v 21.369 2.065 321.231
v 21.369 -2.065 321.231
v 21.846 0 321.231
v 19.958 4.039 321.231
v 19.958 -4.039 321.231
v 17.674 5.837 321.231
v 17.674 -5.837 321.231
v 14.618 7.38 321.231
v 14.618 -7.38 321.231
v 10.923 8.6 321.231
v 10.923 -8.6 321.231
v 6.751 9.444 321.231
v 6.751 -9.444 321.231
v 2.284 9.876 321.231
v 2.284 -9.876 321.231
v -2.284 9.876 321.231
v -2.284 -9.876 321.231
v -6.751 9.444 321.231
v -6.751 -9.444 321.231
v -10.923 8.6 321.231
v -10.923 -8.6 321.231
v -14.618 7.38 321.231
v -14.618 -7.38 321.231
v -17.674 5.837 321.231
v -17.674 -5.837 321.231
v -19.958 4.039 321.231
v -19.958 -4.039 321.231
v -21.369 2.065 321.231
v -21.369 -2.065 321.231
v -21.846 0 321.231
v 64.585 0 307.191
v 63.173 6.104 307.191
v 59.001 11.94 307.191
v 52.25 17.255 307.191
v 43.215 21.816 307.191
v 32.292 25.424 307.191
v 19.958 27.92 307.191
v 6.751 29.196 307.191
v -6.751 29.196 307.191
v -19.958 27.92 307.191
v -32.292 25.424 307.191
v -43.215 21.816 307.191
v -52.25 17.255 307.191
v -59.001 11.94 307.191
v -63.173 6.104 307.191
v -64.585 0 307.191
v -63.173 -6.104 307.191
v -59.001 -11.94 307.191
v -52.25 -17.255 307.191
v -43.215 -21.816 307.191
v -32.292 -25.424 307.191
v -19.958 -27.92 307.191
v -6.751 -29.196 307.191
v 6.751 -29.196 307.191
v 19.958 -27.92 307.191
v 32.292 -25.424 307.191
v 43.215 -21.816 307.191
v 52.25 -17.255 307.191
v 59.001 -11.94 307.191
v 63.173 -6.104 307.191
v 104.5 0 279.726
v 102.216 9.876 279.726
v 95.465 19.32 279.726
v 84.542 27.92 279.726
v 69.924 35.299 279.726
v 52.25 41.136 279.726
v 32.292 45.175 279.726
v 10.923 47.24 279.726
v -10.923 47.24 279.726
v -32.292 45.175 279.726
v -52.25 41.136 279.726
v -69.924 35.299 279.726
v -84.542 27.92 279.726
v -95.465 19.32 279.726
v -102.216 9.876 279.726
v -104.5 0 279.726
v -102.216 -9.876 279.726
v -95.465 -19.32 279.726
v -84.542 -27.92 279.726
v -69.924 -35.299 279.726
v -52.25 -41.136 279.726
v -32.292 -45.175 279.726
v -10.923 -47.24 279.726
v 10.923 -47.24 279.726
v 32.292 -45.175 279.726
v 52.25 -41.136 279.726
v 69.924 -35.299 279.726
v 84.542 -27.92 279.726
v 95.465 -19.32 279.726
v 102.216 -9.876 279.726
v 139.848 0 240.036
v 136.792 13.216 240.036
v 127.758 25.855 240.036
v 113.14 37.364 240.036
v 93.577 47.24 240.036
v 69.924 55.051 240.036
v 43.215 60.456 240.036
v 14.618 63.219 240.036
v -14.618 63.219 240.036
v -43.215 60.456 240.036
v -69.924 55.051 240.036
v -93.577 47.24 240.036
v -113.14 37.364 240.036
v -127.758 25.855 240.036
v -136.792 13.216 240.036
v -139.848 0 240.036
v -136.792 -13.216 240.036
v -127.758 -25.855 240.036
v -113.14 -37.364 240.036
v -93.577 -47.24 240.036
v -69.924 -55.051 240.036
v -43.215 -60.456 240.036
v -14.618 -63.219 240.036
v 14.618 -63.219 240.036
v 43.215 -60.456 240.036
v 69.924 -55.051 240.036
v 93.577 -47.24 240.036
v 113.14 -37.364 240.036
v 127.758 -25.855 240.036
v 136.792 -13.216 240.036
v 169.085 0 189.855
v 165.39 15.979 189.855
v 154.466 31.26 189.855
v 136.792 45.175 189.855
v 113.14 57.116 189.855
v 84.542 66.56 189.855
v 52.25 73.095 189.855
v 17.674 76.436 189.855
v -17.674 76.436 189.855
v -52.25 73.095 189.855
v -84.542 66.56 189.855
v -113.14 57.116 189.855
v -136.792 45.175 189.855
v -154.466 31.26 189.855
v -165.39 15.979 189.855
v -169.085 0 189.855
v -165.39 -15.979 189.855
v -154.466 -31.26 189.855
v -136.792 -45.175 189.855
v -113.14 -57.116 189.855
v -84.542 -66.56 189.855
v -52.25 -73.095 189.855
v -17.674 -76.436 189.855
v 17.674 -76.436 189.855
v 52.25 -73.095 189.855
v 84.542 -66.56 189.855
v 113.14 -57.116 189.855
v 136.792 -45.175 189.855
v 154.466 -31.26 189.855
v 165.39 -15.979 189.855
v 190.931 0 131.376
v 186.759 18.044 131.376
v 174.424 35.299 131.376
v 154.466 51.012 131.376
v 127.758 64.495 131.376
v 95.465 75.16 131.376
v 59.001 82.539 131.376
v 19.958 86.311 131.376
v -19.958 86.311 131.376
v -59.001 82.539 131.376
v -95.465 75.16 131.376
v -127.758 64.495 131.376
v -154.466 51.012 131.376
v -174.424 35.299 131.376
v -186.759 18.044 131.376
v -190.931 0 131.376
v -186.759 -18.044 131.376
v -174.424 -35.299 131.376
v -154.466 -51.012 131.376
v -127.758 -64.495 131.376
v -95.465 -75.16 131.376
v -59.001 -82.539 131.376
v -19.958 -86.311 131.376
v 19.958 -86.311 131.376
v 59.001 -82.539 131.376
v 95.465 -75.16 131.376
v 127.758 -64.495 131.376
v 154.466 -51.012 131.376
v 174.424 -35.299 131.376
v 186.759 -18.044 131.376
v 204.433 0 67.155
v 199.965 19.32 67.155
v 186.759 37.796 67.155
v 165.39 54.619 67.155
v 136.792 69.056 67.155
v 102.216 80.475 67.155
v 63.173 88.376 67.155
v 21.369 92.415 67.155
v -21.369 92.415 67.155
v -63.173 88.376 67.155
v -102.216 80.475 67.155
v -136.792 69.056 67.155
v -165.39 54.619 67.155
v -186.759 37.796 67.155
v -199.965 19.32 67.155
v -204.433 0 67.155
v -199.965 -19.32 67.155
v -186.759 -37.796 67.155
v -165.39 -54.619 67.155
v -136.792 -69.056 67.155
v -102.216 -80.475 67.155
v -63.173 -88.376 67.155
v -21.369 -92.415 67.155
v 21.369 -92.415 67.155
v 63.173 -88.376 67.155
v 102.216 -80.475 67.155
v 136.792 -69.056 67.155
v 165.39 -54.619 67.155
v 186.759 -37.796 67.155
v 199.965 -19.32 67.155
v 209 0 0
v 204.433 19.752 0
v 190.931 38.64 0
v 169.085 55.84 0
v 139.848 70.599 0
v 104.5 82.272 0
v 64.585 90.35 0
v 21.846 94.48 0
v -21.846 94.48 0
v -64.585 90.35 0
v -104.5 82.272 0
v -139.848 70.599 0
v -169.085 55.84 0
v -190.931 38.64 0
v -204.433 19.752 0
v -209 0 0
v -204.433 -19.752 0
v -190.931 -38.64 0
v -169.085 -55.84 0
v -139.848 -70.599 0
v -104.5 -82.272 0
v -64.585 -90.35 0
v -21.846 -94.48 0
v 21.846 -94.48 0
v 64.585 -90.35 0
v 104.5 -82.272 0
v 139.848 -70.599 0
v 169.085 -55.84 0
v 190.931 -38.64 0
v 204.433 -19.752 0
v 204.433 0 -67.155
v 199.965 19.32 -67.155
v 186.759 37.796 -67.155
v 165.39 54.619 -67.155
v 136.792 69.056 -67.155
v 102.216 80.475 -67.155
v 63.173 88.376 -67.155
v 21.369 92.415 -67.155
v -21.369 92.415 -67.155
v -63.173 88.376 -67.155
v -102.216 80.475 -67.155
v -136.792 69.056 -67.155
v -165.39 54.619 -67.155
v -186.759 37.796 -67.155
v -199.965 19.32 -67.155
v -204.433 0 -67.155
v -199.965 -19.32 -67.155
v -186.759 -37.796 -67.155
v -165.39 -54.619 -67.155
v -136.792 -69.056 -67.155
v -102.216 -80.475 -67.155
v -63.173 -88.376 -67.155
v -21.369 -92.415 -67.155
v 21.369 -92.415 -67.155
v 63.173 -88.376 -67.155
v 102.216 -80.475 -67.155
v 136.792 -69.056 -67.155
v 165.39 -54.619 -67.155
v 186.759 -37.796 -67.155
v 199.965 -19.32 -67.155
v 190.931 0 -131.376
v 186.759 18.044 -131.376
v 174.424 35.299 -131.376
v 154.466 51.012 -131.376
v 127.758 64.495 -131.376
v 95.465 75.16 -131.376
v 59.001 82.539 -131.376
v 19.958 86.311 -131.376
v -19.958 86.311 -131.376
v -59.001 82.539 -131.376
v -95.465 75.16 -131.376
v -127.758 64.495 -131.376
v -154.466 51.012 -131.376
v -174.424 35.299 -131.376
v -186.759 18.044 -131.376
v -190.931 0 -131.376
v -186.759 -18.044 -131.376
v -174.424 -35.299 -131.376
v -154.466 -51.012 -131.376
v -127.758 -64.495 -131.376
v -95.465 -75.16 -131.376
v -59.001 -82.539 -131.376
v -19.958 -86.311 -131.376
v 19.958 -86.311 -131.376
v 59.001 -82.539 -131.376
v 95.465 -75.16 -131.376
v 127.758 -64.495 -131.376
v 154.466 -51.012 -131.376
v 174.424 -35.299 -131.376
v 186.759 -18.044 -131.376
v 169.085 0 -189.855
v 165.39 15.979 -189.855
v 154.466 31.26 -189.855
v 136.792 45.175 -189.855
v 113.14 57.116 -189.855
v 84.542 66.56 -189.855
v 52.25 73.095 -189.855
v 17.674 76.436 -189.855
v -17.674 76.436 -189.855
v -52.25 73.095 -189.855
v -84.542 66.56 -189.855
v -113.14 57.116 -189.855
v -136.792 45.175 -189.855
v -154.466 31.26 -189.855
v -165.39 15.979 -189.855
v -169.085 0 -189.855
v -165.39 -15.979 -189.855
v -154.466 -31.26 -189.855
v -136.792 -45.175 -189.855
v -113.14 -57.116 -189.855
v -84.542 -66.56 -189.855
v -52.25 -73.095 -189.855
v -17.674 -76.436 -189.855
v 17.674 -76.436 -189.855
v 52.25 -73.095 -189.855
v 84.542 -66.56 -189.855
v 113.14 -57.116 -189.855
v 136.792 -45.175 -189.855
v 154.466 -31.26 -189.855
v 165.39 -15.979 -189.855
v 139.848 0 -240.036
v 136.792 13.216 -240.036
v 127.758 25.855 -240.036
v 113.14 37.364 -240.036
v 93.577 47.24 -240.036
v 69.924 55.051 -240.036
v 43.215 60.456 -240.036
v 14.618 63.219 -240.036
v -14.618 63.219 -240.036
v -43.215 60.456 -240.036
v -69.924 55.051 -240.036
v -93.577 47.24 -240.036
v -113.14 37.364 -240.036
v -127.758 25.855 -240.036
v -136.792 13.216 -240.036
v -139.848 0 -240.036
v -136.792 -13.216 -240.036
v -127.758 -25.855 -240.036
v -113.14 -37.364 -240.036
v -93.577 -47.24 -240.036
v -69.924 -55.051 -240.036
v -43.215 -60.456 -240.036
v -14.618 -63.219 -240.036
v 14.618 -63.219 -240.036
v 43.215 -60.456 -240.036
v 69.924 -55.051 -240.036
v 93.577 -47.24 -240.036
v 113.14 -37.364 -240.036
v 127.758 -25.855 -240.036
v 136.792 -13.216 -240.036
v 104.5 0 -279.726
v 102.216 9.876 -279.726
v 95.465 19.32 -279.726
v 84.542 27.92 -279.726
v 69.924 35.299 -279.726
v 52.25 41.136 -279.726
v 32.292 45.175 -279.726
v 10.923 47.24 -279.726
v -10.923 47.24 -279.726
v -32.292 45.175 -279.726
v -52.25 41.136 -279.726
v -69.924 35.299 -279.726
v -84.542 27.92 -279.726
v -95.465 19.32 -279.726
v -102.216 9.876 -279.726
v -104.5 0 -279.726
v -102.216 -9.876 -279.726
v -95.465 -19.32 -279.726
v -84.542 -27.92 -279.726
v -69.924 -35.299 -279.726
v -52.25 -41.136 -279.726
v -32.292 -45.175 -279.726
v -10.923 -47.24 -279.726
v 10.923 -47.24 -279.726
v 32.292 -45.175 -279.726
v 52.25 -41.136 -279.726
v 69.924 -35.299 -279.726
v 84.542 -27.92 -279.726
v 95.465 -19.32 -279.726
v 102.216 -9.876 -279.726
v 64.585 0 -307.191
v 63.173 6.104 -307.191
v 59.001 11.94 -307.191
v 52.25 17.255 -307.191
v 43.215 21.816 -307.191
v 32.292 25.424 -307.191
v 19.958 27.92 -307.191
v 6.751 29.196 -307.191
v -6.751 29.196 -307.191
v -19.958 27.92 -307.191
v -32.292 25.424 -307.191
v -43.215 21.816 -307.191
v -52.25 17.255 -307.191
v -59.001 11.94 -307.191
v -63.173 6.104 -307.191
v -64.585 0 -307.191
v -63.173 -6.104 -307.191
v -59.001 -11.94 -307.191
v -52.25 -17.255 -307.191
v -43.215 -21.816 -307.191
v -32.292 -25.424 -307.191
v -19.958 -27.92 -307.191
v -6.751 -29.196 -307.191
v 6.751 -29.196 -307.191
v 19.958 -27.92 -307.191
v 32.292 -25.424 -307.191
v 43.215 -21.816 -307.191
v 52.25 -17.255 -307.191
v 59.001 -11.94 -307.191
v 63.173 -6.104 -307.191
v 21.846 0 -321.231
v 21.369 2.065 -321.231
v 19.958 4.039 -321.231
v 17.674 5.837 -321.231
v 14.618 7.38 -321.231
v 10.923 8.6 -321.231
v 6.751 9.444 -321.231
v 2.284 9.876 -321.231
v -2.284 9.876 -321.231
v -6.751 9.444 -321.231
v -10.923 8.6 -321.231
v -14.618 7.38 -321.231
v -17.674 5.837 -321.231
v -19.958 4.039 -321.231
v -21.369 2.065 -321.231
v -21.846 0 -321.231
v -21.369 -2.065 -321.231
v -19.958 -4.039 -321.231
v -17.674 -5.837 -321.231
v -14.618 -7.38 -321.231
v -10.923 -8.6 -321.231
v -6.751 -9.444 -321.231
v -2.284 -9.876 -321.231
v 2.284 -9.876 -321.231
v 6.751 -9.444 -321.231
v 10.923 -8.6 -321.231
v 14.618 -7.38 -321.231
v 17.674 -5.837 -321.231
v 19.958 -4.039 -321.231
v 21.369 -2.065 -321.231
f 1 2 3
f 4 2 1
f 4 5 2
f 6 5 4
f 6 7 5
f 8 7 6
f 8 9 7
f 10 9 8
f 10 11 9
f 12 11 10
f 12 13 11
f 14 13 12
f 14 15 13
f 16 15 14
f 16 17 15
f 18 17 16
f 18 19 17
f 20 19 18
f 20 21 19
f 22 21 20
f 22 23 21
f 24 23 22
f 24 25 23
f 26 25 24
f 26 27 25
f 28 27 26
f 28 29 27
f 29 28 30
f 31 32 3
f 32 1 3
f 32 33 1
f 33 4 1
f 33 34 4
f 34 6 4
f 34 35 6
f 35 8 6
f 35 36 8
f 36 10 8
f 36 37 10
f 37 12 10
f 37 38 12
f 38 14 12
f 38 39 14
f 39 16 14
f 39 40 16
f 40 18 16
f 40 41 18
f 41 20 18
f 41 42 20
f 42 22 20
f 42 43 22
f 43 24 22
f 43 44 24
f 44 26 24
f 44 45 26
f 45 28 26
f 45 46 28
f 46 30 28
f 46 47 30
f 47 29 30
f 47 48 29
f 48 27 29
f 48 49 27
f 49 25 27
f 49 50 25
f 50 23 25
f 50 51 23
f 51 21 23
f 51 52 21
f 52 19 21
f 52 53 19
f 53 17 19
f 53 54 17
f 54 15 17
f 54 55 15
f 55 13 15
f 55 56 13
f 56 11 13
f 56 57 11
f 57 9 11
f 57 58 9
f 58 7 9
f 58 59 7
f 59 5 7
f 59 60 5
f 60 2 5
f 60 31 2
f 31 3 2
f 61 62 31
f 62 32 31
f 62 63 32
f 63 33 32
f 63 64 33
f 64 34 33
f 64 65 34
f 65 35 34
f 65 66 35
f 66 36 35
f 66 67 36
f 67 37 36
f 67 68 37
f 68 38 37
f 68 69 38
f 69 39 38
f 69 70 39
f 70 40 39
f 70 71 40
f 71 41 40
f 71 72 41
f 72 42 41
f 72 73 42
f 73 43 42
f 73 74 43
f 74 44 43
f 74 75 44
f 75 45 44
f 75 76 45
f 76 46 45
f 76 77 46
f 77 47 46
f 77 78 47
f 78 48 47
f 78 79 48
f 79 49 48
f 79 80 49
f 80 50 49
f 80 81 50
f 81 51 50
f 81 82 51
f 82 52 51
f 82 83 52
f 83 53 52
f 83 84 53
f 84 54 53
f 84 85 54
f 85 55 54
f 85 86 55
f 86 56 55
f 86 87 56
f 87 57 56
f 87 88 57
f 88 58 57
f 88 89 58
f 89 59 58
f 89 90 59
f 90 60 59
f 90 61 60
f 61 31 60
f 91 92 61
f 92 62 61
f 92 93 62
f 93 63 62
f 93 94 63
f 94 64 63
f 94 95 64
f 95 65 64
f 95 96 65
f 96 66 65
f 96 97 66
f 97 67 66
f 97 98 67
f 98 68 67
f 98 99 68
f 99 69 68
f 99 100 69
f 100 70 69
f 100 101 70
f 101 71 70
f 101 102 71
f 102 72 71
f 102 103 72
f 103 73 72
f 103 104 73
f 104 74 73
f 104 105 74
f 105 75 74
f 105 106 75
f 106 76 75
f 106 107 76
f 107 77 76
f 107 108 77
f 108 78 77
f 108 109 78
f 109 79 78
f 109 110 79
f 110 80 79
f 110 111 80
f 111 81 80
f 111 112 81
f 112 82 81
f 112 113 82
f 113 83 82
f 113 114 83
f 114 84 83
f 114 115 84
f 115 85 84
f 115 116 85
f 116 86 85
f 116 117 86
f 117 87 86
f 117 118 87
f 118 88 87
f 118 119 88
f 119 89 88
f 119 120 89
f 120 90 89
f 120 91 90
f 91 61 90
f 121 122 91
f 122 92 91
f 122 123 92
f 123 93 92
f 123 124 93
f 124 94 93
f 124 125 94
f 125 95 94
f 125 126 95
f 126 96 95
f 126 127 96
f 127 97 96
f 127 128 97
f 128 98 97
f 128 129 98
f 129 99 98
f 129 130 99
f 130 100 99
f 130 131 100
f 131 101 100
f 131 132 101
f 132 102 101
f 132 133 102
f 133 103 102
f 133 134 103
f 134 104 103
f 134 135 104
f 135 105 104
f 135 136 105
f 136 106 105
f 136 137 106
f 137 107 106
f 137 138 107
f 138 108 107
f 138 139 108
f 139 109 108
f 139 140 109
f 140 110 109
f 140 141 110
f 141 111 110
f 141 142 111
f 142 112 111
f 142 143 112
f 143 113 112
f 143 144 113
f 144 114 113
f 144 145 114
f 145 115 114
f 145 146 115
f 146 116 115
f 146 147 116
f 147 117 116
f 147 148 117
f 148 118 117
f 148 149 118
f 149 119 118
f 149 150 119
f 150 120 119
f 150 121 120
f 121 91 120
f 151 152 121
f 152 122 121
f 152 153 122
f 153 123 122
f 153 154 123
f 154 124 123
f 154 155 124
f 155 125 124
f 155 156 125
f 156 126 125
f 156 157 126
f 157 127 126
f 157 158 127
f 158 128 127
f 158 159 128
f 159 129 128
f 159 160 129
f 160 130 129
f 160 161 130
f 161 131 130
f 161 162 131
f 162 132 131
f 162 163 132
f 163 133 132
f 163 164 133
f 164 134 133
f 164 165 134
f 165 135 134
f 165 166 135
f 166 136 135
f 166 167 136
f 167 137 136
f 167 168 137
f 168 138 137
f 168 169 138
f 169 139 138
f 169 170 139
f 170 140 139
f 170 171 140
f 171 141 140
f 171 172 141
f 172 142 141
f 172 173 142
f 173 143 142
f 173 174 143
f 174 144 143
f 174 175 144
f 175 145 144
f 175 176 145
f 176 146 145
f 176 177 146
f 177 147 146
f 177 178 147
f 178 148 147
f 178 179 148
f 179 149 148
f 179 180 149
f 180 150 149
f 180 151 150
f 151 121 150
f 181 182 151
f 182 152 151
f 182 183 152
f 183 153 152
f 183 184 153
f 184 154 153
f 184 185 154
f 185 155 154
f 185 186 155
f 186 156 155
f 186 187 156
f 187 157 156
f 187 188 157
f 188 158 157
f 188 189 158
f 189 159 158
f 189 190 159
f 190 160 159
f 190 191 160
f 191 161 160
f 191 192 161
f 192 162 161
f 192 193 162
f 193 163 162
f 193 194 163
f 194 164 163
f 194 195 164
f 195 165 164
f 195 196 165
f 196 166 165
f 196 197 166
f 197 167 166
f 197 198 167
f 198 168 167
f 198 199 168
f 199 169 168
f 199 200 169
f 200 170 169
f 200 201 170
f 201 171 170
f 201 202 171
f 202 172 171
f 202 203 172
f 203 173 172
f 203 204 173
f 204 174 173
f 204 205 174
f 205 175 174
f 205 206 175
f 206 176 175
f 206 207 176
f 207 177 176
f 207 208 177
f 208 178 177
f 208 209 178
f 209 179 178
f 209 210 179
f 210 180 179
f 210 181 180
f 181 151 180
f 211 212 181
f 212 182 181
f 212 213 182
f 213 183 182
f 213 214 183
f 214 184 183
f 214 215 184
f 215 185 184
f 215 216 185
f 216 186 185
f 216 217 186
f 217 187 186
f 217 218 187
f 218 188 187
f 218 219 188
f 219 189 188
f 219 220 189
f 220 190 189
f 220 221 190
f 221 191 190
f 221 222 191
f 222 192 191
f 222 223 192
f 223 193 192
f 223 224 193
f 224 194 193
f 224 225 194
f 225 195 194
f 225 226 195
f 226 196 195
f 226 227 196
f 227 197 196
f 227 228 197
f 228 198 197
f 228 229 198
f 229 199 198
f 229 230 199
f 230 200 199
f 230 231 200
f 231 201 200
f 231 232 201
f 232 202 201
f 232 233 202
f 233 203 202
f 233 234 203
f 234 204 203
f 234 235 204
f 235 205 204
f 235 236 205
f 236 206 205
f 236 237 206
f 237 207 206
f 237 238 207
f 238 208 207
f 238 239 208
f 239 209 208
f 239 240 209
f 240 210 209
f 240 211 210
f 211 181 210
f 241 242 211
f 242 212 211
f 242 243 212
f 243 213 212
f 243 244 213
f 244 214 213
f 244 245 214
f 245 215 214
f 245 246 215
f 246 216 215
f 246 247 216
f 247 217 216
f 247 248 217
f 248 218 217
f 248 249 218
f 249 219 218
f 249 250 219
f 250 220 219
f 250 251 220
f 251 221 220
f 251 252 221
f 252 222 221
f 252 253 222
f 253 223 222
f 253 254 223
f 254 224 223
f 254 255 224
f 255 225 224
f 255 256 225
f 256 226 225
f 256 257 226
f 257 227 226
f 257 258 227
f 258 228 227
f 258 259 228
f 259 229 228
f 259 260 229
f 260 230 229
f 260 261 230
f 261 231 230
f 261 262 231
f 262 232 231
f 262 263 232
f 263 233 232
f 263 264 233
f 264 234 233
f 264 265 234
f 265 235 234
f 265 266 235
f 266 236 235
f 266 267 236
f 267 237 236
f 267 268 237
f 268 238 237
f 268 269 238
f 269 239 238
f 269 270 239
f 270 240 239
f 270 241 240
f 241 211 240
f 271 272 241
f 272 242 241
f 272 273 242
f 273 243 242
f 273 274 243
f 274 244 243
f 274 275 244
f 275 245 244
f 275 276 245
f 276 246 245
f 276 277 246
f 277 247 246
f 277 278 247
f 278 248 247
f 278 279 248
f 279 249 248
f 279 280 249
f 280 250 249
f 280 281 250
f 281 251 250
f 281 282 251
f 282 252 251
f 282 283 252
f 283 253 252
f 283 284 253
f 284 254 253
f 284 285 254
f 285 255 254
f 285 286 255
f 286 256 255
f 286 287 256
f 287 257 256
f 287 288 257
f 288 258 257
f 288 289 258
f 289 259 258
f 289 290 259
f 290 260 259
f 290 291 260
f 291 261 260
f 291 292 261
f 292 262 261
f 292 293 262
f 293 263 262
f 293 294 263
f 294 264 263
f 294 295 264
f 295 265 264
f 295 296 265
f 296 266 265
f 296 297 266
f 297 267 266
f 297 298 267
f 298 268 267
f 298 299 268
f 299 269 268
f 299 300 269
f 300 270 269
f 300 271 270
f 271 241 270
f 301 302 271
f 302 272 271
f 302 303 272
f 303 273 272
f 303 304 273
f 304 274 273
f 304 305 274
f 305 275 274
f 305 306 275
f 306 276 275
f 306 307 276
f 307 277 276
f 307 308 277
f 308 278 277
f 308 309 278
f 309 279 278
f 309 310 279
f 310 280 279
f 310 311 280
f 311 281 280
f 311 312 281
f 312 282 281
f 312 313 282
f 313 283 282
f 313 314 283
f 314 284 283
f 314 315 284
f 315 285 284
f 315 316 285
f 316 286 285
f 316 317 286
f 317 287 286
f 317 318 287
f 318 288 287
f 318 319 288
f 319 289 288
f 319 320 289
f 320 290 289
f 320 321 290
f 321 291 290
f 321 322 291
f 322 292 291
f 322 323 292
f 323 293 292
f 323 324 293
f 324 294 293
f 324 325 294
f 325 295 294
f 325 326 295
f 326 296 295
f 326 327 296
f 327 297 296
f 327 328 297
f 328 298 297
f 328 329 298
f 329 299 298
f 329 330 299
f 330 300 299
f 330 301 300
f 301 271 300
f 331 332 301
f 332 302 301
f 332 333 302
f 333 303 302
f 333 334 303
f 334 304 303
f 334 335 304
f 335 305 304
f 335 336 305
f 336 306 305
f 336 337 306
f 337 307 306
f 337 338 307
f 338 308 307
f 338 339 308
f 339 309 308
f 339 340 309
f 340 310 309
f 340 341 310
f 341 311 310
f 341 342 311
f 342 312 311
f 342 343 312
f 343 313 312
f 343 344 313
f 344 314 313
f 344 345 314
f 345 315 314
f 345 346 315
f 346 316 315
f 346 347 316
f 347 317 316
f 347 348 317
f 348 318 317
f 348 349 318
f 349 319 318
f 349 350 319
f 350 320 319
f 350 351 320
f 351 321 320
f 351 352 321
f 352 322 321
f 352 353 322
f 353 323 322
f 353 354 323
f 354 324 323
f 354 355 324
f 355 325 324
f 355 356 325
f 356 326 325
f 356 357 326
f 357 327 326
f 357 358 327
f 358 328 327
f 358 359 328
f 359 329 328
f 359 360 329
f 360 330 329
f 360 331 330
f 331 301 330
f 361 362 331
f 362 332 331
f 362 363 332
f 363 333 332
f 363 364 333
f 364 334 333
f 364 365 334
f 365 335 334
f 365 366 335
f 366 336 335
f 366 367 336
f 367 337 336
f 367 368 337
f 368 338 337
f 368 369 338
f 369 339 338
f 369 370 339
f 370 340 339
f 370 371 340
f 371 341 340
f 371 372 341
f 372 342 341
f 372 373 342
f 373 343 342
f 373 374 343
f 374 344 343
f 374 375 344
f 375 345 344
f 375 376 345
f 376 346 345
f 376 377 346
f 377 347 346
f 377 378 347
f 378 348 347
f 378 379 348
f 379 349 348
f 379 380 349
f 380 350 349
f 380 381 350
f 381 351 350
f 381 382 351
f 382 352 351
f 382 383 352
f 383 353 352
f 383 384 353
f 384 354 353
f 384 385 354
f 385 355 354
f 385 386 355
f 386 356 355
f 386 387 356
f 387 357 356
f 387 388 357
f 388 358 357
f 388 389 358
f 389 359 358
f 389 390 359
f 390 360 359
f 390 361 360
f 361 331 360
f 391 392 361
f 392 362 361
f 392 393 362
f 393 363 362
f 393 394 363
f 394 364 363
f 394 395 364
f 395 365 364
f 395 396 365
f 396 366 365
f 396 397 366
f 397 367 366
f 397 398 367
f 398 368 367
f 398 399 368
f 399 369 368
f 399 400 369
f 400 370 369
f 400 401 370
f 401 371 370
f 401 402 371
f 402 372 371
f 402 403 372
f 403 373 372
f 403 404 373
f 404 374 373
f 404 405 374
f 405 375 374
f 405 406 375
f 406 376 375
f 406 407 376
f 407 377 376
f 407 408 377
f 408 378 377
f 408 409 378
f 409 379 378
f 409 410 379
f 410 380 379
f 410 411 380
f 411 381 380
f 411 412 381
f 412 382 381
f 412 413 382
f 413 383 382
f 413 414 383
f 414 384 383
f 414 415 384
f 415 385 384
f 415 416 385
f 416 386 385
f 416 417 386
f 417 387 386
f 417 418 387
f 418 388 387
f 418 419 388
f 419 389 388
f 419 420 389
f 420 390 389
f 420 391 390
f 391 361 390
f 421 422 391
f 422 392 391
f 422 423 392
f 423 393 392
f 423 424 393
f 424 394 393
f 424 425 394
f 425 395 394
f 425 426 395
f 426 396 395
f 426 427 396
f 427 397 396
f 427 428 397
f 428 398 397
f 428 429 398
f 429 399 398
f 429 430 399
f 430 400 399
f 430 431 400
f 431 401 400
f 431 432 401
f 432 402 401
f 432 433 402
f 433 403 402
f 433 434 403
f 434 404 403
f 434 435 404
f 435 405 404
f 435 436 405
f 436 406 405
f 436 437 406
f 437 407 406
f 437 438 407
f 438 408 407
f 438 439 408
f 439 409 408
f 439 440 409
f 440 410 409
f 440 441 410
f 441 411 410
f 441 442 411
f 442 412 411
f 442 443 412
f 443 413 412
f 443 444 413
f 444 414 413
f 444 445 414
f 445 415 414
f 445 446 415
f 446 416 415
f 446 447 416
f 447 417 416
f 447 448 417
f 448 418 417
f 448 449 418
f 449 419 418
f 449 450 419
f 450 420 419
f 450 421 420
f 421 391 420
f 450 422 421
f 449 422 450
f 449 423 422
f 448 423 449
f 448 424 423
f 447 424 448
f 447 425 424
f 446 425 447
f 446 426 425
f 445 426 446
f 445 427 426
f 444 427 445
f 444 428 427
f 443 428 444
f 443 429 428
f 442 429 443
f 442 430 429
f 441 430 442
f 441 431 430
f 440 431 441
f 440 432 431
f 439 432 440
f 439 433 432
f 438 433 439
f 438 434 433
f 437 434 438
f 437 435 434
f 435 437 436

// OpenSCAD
// Generated by SolidPython 1.0.1 on 2020-07-29 00:46:49


scale(v = [11, 5, 17]) {
	sphere(r = 19);
}
/***********************************************
*********      SolidPython code:      **********
************************************************
 
# import packages: SolidPython
from solid import *
from solid.utils import *
from itertools import chain, combinations, permutations


class Resize:

    def __init__(self, scad_file):
        self.scad_file = scad_file
        #self.scad_file = import_scad(scad_file)
        # cone/cylinder param:
        self.r1 = 0
        self.r2 = 0
        self.h = 0
        # rectangular prism param:
        self.w = 0
        self.l = 0
        # ellipse param:
        self.r = 0

    # import OpenScad code (file name corresponds to shape)


    # classify shape + parameters
    def assign(self, param1, param2, param3):
        if self.scad_file == 'cone.scad':
            self.r1 = param1
            self.r2 = param2
            self.h = param3
        elif self.scad_file == 'cylinder.scad':
            self.r1 = param1
            self.r2 = param2
            self.h = param3
        elif self.scad_file == 'rectangularPrism.scad':
            self.h = param1
            self.l = param2
            self.w = param3
        else:
            self.r = param1
            self.h = param2

    # resize parameters
    def iterate(self):
        x = range(3, 20, 2)
        i = 1
        if self.scad_file == 'cone.scad':
            tempList = list(permutations(x, 2))
            for temp in tempList:
                param1 = temp[0]
                param2 = temp[1]
                filepath = 'produced_scad_files/' + 'cone' + str(param1) + '_' + str(param2) + '_' + '.scad'
                scad_render_to_file(cylinder(h=param1, r1=param2, r2=0), filepath)

        elif self.scad_file == 'cylinder.scad':
            tempList = list(permutations(x, 3))
            for temp in tempList:
                param1 = temp[0]
                param2 = temp[1]
                filepath = 'produced_scad_files/' + 'cylinder' + str(param1) + '_' + str(param2) + '_' + '.scad'
                scad_render_to_file(cylinder(h=param1, r1=param2, r2=param2), filepath)

        elif self.scad_file == 'rectangularPrism.scad':
            tempList = list(permutations(x, 3))
            for temp in tempList:
                param1 = temp[0]
                param2 = temp[1]
                param3 = temp[2]
                filepath = 'produced_scad_files/' + 'rectangularPrism' + str(param1) + '_' + str(param2) + '_' + str(
                    param3) + '.scad'
                scad_render_to_file(cube(size=(param1, param2, param3)), filepath)

        elif self.scad_file == 'ellipse.scad':
            tempList = list(permutations(x, 4))
            for temp in tempList:
                param1 = temp[0]
                param2 = temp[1]
                param3 = temp[2]
                param4 = temp[3]
                filepath = 'produced_scad_files/' + 'ellipse' + str(param1) + '_' + str(param2) + '_' + str(param3) + '_' + str(param4) + '.scad'
                scad_render_to_file(scale([param1, param2, param3])(sphere(r=param4)), filepath)

    def render_to_scadfile(self):
        scad_render_to_file(scad, 'example.scad') 
 
************************************************/
